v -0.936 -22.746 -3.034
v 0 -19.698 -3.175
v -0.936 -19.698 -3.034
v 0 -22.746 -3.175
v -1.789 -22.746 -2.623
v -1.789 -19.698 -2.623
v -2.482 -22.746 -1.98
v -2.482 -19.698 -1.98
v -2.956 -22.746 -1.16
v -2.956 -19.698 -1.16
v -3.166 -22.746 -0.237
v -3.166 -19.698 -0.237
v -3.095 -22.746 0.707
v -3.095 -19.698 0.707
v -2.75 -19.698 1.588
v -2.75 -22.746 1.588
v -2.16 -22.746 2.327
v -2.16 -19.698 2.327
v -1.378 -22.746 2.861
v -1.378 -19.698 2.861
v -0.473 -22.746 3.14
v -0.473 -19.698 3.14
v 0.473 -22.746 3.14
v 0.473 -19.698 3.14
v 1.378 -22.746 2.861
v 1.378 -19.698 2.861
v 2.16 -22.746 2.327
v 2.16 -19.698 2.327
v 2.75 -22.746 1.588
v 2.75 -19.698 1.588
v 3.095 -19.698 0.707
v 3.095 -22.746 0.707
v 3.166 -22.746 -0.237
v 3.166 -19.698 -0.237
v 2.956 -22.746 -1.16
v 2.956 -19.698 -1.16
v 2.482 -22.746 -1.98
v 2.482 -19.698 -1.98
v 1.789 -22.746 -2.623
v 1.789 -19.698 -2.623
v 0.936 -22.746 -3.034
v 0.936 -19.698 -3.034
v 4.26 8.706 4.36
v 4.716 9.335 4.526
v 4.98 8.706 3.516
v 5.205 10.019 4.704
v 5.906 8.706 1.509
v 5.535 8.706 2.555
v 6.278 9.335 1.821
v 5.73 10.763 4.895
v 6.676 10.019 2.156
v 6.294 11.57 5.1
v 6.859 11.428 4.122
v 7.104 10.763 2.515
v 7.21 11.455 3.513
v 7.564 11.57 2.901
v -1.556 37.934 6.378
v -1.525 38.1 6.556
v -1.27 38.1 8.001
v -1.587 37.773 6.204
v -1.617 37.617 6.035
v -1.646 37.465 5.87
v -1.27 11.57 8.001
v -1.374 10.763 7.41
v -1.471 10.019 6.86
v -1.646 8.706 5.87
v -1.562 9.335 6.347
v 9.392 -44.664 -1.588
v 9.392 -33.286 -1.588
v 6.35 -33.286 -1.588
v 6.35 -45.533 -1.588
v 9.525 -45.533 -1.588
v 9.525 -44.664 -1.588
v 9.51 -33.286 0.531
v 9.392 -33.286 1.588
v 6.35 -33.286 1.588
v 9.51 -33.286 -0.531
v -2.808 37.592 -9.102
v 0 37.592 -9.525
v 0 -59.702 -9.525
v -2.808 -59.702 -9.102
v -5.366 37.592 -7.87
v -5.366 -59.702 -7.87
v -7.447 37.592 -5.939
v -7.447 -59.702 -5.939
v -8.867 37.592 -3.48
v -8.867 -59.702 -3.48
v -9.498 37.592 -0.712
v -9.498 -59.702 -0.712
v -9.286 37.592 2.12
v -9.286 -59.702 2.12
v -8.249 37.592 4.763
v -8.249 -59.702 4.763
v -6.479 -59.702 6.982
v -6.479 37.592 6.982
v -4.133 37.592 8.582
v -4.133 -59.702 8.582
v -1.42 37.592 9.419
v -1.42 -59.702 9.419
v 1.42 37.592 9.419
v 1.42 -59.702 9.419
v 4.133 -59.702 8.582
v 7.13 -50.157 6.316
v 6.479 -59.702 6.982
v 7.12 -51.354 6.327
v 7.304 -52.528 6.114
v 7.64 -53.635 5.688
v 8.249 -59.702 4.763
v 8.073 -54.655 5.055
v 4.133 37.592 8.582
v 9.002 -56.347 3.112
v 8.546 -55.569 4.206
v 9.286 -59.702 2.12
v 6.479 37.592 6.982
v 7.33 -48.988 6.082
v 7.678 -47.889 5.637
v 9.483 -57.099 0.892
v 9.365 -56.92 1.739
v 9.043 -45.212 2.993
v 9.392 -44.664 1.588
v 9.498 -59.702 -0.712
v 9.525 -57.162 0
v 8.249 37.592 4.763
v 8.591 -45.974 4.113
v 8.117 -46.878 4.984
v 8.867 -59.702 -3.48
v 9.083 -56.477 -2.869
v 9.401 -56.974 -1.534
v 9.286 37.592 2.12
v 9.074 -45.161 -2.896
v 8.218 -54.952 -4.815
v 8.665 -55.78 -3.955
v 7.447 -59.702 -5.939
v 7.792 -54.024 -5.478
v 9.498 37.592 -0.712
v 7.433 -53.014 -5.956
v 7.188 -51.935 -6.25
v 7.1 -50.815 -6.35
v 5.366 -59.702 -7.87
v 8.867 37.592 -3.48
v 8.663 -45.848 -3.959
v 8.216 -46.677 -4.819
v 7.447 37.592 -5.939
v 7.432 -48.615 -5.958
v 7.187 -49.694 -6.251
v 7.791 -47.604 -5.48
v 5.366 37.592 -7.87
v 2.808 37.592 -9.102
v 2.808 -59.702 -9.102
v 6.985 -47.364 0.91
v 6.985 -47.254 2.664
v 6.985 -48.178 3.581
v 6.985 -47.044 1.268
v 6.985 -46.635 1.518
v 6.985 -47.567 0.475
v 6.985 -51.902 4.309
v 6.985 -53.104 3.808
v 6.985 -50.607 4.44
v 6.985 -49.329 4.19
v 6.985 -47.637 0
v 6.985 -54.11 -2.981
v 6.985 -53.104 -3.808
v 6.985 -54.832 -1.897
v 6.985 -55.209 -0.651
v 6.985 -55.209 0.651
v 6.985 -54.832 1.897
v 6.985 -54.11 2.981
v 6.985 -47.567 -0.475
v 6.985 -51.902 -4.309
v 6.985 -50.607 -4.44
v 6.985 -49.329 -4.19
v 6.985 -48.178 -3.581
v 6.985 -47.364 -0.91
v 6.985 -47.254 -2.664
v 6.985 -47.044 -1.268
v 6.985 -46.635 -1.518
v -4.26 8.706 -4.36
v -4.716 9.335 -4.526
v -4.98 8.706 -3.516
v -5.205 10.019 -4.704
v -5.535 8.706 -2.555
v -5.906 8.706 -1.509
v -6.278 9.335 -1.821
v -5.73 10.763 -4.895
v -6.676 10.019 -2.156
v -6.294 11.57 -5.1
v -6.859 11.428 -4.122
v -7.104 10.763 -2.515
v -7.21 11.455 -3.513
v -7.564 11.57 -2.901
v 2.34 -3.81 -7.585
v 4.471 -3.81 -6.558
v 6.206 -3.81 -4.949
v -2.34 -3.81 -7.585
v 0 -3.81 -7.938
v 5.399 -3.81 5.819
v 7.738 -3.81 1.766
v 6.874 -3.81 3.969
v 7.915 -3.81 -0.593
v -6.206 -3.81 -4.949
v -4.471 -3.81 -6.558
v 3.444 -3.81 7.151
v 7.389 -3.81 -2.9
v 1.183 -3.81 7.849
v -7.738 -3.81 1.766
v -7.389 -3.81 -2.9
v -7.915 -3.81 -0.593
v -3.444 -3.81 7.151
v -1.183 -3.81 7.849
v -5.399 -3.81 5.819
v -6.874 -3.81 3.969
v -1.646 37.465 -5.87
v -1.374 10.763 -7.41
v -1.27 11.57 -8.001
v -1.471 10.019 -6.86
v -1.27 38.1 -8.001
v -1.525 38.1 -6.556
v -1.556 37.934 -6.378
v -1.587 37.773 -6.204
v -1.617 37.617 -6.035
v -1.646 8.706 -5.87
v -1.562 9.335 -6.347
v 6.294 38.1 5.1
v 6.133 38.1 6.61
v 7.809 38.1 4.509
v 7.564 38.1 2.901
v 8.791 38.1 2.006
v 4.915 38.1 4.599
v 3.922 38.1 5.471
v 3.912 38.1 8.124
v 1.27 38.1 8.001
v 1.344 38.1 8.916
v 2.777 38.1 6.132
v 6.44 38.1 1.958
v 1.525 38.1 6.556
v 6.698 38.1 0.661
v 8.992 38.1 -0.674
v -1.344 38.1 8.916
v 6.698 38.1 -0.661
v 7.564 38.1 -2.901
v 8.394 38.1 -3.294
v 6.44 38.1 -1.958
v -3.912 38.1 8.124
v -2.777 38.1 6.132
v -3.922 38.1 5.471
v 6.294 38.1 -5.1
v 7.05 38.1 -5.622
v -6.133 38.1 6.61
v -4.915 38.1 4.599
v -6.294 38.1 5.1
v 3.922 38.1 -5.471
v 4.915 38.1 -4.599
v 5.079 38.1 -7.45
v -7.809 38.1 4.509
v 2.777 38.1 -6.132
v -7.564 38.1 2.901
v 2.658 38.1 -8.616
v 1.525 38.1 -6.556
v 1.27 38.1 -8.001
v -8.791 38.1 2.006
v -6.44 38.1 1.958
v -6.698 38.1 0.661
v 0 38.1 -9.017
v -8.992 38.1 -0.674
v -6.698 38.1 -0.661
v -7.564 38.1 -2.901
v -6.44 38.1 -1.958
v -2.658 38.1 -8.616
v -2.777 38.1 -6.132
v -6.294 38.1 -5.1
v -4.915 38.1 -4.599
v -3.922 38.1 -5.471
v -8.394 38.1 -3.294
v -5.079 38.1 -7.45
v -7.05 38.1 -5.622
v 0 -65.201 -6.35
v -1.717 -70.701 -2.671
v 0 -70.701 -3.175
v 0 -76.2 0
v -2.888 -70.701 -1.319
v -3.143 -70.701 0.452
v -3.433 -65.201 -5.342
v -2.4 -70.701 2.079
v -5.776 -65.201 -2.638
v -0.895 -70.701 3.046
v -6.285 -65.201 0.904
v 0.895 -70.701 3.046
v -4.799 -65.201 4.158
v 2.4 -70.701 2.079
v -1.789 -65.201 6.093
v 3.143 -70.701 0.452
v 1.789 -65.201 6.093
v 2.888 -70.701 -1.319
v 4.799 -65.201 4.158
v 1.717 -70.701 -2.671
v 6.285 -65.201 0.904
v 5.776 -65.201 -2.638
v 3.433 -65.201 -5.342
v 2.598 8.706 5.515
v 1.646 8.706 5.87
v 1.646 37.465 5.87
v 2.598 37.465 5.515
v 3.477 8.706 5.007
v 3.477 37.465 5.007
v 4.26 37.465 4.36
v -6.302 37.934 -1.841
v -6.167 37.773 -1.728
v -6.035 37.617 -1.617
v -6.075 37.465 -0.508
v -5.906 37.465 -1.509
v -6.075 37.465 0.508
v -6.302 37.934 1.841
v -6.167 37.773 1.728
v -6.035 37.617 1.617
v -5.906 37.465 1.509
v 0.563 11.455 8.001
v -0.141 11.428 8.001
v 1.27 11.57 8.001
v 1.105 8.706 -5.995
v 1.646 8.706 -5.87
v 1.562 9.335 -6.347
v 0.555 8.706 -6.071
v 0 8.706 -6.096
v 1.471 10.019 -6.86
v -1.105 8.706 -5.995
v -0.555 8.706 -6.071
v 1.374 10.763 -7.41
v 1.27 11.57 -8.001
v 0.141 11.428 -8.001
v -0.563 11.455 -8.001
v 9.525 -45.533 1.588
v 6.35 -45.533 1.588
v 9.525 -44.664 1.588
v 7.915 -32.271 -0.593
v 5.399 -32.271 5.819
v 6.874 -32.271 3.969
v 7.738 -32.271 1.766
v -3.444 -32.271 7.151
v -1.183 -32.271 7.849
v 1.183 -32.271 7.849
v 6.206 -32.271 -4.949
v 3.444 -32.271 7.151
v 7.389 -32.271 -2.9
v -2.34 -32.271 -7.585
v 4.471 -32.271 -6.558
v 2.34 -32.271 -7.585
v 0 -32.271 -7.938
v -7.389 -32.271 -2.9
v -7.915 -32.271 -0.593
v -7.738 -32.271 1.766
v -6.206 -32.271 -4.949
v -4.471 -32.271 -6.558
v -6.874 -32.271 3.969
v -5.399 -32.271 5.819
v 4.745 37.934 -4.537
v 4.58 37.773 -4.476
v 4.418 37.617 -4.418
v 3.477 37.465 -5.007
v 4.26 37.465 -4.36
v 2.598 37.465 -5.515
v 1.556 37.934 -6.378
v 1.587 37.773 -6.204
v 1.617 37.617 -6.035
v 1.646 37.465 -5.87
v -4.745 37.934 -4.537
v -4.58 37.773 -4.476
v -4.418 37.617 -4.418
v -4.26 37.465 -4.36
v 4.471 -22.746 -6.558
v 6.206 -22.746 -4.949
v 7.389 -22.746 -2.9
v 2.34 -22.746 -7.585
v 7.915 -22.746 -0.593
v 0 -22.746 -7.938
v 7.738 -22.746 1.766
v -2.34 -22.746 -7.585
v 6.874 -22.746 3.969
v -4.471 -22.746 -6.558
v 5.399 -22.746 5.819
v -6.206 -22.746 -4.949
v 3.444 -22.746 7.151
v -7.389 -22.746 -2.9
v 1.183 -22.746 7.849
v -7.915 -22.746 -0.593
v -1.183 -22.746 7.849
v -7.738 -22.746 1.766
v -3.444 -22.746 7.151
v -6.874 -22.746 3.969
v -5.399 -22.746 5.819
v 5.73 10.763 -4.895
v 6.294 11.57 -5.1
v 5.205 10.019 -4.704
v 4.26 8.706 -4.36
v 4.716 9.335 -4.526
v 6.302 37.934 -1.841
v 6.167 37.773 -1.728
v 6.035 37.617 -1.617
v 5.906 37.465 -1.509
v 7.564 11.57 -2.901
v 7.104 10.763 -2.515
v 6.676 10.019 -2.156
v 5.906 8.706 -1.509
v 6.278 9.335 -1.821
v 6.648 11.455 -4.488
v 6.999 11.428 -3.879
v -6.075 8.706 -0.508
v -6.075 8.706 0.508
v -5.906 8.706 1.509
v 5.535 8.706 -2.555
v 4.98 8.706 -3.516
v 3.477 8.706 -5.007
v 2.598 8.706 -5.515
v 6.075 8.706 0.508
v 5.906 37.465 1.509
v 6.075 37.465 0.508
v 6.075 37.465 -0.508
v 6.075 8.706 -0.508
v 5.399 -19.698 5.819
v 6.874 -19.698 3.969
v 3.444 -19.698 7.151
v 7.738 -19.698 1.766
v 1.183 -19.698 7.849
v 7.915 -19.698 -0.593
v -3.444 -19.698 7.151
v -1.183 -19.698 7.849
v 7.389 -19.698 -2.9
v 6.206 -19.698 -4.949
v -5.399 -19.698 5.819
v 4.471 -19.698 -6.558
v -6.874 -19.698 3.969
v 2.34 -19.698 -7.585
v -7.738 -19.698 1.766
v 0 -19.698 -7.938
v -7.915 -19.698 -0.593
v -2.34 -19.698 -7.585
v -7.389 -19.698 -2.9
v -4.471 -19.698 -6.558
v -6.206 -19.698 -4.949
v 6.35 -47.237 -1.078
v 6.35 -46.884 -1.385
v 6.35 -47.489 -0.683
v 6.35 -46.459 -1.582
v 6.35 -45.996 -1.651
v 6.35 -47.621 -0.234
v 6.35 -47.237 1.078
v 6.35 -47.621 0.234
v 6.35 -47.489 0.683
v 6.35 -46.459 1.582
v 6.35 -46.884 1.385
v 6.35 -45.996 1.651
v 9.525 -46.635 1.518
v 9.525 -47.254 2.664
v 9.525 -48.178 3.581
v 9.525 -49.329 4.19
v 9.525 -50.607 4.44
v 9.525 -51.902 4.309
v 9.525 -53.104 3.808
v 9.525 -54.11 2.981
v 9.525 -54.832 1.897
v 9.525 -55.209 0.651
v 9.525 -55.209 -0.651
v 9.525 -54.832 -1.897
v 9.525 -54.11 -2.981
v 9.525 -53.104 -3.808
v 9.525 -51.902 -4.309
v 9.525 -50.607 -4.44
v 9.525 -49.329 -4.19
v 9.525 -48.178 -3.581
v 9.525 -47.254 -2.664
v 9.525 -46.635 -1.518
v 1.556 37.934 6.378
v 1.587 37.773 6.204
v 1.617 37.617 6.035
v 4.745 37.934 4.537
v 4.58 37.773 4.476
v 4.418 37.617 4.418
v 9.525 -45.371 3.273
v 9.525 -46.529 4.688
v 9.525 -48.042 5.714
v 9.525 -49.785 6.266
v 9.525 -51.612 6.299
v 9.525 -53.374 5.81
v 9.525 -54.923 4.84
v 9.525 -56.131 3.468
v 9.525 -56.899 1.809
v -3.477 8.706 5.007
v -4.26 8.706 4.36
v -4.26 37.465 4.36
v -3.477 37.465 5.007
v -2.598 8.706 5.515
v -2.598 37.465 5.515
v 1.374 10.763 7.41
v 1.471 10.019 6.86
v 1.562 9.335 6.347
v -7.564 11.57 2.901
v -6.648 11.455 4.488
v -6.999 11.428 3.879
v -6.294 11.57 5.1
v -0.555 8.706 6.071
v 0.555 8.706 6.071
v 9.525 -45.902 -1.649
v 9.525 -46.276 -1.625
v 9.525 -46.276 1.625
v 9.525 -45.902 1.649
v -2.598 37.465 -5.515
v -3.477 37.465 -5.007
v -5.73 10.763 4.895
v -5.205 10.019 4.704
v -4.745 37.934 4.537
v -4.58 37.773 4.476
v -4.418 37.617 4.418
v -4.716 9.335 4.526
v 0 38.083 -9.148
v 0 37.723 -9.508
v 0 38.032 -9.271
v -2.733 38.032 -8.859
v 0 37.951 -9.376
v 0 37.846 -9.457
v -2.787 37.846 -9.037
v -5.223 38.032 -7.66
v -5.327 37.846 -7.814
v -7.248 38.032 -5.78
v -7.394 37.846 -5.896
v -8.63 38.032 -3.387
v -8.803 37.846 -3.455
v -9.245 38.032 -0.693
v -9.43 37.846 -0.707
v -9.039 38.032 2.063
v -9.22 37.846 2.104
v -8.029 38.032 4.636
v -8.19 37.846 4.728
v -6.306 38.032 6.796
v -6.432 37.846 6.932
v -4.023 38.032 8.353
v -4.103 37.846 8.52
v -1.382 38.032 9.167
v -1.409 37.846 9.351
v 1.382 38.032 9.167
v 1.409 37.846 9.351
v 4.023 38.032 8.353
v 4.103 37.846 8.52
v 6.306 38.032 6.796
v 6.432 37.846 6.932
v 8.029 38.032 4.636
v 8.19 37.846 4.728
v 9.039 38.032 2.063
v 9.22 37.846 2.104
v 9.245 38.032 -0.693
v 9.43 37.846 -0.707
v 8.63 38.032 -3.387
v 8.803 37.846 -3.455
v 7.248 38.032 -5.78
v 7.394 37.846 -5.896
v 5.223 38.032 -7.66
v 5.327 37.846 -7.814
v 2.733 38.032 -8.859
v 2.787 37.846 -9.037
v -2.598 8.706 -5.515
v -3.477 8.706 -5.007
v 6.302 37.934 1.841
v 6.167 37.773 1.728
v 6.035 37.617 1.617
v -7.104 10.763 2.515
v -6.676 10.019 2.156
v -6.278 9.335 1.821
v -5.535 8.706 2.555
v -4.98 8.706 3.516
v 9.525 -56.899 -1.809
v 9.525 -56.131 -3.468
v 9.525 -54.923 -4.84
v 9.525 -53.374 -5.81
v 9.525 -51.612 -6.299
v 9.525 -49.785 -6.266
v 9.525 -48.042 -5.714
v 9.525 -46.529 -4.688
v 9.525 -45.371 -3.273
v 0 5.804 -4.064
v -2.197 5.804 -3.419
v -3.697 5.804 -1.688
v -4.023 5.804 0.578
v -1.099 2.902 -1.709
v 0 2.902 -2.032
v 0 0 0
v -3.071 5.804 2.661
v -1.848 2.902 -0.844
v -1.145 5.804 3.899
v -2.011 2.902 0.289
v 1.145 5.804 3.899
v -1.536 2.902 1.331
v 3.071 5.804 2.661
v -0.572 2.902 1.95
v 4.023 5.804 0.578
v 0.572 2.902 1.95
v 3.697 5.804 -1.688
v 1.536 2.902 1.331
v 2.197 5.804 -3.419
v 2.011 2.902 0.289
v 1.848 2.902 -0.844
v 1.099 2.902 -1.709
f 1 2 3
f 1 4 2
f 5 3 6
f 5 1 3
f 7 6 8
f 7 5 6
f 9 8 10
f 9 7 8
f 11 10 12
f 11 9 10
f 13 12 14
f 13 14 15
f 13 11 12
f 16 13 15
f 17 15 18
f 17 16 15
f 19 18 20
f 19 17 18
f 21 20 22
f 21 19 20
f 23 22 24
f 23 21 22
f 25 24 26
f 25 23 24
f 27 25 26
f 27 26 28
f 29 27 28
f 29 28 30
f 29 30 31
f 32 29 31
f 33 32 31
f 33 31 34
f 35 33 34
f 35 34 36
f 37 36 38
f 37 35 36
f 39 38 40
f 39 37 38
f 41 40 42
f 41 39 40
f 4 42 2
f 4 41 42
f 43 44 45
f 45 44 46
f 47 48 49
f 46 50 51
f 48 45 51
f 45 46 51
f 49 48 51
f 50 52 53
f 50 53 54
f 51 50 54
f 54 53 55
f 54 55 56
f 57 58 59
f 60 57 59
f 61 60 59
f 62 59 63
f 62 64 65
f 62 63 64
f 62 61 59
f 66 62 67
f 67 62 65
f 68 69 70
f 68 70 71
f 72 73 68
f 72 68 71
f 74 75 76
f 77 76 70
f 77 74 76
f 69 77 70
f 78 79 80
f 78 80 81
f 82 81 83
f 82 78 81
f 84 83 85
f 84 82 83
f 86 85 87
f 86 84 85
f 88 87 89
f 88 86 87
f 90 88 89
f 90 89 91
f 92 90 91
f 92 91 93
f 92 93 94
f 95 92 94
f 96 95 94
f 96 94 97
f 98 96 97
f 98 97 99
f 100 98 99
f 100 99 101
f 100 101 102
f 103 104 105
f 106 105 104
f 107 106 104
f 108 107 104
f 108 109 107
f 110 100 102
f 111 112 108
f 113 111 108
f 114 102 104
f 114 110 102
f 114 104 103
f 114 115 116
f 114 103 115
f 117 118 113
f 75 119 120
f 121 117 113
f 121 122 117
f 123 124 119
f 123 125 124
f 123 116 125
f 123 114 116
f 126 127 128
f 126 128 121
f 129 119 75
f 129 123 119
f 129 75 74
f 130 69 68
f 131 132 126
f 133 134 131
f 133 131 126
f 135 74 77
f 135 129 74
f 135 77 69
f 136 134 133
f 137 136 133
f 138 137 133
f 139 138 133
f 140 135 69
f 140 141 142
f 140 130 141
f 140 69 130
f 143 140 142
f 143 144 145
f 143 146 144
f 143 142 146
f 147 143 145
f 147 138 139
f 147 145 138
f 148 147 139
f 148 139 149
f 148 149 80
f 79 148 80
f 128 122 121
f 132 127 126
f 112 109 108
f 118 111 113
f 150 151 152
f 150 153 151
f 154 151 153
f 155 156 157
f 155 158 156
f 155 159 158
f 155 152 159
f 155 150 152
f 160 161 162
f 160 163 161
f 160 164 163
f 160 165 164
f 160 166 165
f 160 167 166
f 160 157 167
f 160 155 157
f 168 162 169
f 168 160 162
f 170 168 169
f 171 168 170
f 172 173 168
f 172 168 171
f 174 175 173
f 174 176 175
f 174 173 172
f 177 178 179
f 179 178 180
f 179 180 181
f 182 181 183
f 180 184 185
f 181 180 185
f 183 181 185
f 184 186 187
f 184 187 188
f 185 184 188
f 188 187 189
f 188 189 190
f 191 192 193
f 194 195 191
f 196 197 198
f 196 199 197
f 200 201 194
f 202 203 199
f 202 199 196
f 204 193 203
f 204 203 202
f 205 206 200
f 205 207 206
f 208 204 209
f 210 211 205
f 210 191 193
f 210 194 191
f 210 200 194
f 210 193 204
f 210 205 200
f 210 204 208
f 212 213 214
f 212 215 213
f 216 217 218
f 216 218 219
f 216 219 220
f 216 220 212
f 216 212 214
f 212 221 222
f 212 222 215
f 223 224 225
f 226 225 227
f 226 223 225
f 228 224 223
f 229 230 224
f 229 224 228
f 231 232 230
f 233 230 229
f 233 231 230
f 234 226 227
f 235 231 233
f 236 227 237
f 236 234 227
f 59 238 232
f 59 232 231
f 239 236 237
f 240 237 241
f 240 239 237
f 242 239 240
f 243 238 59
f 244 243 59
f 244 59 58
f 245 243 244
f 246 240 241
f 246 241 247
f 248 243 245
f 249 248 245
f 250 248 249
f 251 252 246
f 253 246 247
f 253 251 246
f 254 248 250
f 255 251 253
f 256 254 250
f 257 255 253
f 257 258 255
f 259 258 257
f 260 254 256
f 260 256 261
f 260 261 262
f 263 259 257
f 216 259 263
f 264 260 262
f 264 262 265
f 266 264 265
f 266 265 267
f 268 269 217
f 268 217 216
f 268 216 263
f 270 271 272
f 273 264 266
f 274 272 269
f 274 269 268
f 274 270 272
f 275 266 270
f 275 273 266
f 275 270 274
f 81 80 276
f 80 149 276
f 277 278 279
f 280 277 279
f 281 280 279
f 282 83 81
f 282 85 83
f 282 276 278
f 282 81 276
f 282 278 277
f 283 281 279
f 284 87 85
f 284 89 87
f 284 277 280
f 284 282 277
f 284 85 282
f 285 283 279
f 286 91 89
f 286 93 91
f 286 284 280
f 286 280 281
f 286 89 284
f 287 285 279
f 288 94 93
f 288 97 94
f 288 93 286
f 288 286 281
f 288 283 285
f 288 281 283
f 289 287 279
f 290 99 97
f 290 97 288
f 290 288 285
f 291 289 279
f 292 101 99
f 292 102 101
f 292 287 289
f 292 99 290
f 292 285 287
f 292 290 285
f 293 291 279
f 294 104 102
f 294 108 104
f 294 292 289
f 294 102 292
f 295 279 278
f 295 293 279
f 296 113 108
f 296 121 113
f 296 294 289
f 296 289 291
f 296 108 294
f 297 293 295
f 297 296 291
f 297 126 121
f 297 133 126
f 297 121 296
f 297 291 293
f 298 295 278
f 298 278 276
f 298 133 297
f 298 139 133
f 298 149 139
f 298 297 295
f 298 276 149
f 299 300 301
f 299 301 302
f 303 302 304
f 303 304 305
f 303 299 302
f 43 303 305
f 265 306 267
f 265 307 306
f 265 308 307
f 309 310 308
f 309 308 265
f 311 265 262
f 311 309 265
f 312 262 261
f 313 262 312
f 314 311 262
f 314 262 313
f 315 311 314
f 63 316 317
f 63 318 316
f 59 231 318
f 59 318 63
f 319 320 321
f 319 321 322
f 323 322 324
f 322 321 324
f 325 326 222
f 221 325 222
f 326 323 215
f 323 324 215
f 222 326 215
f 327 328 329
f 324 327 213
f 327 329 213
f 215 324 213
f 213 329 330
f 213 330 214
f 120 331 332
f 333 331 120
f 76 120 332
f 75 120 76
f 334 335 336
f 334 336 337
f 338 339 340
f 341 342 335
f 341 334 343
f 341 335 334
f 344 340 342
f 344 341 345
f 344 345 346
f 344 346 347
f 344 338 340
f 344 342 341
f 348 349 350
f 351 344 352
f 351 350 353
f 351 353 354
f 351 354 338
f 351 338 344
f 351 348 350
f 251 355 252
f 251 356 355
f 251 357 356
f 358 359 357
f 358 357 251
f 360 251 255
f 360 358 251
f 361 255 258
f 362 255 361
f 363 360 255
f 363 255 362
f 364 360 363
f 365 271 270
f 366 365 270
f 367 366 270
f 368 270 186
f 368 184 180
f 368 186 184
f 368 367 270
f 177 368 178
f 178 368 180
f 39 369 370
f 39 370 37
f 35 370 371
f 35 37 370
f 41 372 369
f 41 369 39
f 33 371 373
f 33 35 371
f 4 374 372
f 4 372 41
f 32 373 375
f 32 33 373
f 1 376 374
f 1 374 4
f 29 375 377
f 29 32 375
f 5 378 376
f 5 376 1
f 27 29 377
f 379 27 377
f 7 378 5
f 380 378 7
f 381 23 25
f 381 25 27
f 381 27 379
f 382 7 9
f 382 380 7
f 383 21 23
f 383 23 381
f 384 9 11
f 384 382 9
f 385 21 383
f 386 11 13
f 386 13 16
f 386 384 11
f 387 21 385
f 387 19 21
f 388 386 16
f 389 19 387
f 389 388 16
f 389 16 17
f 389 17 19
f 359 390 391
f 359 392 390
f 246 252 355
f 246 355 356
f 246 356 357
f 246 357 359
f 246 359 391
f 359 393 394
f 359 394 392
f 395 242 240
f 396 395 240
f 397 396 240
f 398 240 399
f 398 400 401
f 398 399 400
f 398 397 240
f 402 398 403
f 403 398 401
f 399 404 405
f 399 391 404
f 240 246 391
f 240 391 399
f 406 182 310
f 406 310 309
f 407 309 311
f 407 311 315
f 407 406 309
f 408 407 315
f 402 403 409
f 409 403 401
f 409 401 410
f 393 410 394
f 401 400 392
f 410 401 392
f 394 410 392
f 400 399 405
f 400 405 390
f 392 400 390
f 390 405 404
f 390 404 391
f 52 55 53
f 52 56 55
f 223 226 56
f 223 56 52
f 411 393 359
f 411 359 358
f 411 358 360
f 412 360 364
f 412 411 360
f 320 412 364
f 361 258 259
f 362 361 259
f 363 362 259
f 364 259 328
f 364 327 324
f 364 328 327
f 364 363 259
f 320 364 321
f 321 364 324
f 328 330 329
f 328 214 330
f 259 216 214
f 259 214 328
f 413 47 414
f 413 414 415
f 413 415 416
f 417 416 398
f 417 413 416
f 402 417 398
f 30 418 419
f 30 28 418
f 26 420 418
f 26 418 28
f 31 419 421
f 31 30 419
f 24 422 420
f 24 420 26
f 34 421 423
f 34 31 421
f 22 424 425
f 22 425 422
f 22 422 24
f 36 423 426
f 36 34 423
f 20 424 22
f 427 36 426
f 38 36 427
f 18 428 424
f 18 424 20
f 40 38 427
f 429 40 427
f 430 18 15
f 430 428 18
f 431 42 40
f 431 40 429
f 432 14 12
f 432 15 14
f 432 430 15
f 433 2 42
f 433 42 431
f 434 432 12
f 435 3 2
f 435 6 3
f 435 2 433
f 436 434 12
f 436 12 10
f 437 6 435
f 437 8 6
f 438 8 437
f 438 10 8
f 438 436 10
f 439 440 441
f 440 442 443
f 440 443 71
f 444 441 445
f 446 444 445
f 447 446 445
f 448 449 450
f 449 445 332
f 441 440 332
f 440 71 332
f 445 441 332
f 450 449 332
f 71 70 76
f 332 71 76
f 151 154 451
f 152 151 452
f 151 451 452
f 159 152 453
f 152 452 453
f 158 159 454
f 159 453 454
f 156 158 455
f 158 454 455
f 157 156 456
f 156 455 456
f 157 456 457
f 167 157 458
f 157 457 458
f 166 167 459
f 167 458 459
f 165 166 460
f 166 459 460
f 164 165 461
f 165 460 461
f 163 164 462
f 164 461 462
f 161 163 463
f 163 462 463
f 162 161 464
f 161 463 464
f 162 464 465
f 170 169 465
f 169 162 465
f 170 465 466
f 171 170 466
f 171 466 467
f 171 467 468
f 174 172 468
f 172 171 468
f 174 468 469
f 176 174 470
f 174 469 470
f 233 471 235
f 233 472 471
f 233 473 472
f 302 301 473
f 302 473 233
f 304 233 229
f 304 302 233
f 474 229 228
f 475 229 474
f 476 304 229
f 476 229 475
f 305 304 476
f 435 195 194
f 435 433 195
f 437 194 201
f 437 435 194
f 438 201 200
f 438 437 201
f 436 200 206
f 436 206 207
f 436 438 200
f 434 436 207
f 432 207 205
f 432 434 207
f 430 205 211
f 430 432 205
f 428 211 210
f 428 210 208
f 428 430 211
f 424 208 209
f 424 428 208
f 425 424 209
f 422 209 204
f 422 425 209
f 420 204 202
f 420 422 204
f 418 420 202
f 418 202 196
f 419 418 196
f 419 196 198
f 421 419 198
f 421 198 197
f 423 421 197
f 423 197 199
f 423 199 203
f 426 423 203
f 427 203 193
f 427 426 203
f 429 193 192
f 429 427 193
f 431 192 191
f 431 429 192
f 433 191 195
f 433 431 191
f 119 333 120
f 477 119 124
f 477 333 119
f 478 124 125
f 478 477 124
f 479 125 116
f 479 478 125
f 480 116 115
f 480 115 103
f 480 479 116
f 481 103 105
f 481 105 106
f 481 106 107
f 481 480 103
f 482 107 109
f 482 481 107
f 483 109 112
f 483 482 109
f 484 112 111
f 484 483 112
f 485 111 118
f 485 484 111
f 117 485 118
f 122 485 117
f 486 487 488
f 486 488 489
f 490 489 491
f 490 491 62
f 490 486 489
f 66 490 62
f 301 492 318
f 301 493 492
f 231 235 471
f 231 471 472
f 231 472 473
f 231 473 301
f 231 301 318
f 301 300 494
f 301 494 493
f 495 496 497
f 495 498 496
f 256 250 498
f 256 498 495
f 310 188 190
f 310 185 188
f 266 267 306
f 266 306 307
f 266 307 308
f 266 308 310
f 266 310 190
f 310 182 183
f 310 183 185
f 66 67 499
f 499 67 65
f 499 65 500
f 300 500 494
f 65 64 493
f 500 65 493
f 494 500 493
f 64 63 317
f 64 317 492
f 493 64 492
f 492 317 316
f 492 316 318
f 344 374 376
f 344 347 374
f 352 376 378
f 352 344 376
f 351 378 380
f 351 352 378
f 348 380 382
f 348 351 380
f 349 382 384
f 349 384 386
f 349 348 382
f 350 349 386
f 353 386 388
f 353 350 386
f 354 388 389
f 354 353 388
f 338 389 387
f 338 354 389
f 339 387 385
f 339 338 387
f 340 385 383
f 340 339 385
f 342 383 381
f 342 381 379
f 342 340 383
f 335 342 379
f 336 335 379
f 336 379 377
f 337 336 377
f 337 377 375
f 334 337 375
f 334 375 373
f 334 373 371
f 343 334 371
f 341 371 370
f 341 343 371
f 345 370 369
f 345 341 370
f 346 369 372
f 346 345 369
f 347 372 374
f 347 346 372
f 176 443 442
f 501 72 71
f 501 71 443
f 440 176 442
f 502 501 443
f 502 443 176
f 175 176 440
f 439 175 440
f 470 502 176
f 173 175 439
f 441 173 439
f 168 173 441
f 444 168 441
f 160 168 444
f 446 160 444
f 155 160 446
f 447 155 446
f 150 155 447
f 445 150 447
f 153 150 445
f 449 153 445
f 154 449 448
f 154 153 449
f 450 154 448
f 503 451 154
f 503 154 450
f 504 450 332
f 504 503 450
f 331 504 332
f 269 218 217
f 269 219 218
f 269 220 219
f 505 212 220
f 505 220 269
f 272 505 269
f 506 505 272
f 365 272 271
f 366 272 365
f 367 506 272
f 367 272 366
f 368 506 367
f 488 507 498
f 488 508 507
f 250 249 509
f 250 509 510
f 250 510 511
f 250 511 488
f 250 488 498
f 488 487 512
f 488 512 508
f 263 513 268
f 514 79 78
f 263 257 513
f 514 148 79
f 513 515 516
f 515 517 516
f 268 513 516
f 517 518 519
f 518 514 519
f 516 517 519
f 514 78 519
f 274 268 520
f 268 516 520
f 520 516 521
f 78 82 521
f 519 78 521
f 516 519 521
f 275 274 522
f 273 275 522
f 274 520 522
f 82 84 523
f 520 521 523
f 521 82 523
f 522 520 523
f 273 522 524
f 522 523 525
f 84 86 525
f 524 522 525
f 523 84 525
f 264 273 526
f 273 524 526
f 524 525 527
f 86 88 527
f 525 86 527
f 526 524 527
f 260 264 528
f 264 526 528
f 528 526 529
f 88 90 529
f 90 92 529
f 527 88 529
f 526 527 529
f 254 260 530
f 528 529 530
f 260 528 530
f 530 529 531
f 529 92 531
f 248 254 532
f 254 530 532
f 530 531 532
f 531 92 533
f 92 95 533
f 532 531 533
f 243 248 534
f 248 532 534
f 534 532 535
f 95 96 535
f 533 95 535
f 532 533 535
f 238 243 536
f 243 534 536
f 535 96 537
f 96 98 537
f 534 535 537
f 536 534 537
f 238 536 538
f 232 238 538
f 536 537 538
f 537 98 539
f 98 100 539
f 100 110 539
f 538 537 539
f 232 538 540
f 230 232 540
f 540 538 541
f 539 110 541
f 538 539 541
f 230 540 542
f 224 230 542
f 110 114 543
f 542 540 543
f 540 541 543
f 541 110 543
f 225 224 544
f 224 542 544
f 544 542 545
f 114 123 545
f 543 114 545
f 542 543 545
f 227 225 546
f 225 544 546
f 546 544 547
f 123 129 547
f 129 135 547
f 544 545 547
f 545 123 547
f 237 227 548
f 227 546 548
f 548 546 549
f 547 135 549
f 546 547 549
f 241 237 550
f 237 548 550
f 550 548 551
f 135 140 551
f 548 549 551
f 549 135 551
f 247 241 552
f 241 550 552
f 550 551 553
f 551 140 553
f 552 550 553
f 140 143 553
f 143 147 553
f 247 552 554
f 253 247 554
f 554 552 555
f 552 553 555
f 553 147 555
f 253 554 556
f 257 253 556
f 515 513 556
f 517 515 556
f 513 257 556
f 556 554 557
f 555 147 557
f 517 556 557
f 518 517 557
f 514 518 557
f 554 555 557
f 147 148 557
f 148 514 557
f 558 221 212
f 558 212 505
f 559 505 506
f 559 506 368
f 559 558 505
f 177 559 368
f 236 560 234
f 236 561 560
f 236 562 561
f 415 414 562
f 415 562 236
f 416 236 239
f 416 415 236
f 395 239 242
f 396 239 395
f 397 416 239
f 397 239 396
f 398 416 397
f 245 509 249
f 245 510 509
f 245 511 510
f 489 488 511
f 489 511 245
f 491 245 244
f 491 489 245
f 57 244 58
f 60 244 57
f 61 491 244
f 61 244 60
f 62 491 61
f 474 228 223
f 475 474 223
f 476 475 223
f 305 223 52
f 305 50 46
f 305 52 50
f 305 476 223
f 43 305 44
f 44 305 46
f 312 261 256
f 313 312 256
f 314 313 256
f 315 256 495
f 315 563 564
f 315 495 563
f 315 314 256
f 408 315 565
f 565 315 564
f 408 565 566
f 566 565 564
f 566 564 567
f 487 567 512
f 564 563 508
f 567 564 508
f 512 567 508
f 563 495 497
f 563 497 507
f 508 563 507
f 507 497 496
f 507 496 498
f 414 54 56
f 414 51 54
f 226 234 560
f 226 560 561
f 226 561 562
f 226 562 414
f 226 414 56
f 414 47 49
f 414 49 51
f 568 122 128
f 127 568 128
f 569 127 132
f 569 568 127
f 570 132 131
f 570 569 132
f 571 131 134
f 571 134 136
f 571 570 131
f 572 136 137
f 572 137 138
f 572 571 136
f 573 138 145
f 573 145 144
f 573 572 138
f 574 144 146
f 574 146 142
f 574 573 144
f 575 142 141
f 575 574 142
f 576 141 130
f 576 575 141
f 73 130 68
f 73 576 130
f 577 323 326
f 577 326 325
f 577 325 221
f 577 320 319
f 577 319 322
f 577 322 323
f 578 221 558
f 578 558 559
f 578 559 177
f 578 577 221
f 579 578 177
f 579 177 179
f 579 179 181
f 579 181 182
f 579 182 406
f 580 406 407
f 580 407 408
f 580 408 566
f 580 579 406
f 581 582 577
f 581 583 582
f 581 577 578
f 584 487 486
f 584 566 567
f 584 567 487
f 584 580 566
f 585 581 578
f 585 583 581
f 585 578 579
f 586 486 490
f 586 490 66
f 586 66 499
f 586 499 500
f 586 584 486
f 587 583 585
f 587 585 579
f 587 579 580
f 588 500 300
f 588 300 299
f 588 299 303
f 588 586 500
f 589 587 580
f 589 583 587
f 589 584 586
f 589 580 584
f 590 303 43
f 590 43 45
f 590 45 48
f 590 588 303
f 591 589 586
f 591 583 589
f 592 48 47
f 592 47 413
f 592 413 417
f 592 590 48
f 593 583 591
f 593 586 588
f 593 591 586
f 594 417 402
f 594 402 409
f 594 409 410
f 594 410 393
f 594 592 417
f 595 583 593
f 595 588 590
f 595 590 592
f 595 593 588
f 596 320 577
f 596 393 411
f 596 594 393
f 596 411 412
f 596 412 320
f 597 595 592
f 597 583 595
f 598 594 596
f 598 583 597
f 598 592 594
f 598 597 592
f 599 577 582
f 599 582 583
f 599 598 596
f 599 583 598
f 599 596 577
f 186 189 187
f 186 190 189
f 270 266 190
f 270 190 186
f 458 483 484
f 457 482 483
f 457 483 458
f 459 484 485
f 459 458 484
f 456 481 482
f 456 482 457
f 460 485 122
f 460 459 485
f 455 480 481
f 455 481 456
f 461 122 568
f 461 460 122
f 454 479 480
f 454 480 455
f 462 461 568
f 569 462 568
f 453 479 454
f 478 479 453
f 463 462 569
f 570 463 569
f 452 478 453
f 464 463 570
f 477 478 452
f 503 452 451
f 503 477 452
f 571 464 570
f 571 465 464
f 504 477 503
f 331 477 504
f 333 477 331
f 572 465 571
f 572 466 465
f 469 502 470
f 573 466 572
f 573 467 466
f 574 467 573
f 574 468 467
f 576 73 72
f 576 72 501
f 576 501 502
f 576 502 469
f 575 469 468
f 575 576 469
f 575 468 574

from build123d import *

# Parameters (mm, degrees)
BOSS_EXTRUDE1_REACH = 81.121
SENSOR_R            = 6.35
CHAMFER1_SIZE       = 0.635
FILLET3_R           = 0.508
SKETCH4_R           = 4.445
CUT_EXTRUDE1_DEPTH  = 2.54
CUT_EXTRUDE2_DEPTH  = 3.175
CUT_EXTRUDE8_REACH  = 117.091
CIRPATTERN1_COUNT   = 6


with BuildPart() as part:
    # Sketch1 → mainBody (revolve)
    with BuildSketch(Plane(origin=(0, 0, 0), x_dir=(0, 0, -1), z_dir=(1, 0, 0)), mode=Mode.PRIVATE) as mainbody_sk:
        Polygon((-6.096, 38.1), (-6.096, 8.705990249), (0, 0), (0, -76.2), (-9.525, -59.702216058), (-9.525, 38.1), align=None)
    revolve(mainbody_sk.sketch.rotate(Axis((0, 0, 0), (0, 1, 0)), 180), axis=Axis((0, 0, 0), (0, 1, 0)))

    # sensor → Boss-Extrude1 (add, up to next)
    with BuildSketch(Plane(origin=(9.525, 0, 0), x_dir=(0, 0, -1), z_dir=(1, 0, 0)), mode=Mode.PRIVATE) as boss_extrude1_sk1:
        with Locations((0, -50.812216058)):
            Circle(SENSOR_R)
    boss_extrude1_tool1 = extrude(boss_extrude1_sk1.sketch, amount=-BOSS_EXTRUDE1_REACH, mode=Mode.PRIVATE) - part.part
    add(boss_extrude1_tool1.solids().sort_by_distance((9.525, -50.812216, 0))[0])
    add(boss_extrude1_tool1.solids().sort_by_distance((9.525, -50.812216, 0))[1])

    # Chamfer1
    chamfer1_edges = [part.edges().sort_by_distance(p)[0] for p in [
        (0, 38.1, 6.096),
    ]]
    chamfer(chamfer1_edges, length=CHAMFER1_SIZE)

    # Fillet3
    fillet3_edges = [part.edges().sort_by_distance(p)[0] for p in [
        (0, 38.1, 9.525),
    ]]
    fillet(fillet3_edges, radius=FILLET3_R)

    # Sketch4 → Cut-Extrude1 (cut)
    with BuildSketch(Plane(origin=(9.525, 0, 0), x_dir=(0, 0, -1), z_dir=(1, 0, 0))):
        with Locations((0, -50.812216058)):
            Circle(SKETCH4_R)
    extrude(amount=-CUT_EXTRUDE1_DEPTH, mode=Mode.SUBTRACT)

    # Sketch5 → Cut-Extrude2 (cut)
    with BuildSketch(Plane(origin=(9.525, 0, 0), x_dir=(0, 0, -1), z_dir=(1, 0, 0))):
        with BuildLine():
            Line((-1.5875, -33.286216058), (1.5875, -33.286216058))
            Line((1.5875, -33.286216058), (1.5875, -45.532735353))
            ThreePointArc((1.5875, -45.532735353), (0, -47.637216058), (-1.5875, -45.532735353))
            Line((-1.5875, -45.532735353), (-1.5875, -33.286216058))
        make_face()
    extrude(amount=-CUT_EXTRUDE2_DEPTH, mode=Mode.SUBTRACT)

    # Cut-Extrude8: up to this cone (the profile starts inside it)
    cut_extrude8_end = Plane(origin=(0, 38.1, 0), z_dir=(0, 1, 0)).offset(-38.099999) * Cone(1e-06, 127.696083561, 182.368906206, align=(Align.CENTER, Align.CENTER, Align.MIN), mode=Mode.PRIVATE)
    # Sketch13 → Cut-Extrude8 (cut, up to the surface)
    with BuildSketch(Plane(origin=(0, 38.1, 0), x_dir=(1, 0, 0), z_dir=(0, 1, 0)), mode=Mode.PRIVATE) as cut_extrude8_sk1:
        Polygon((-1.27, 8.001), (1.27, 8.001), (2.27589157, 2.296305428), (-2.27589157, 2.296305428), align=None)
    cut_extrude8_tool1 = extrude(cut_extrude8_sk1.sketch, amount=-CUT_EXTRUDE8_REACH, mode=Mode.PRIVATE) & cut_extrude8_end
    cut_extrude8 = cut_extrude8_tool1.solids().sort_by_distance((0, 38.1, -4.878937))[0]
    add(cut_extrude8, mode=Mode.SUBTRACT)

    # CirPattern1: Cut-Extrude8 ×6 about axis
    cirpattern1_axis = Axis((0, 0, 0), (0, 1, 0))
    for i in range(1, CIRPATTERN1_COUNT):
        add(cut_extrude8.rotate(cirpattern1_axis, i * 360 / CIRPATTERN1_COUNT), mode=Mode.SUBTRACT)

    # Sketch14 → Cut-Revolve4 (revolve, cut)
    with BuildSketch(Plane.XY, mode=Mode.PRIVATE) as cut_revolve4_sk:
        Polygon((0, -3.81), (7.9375, -3.81), (7.9375, -19.6977), (3.175, -19.6977), (3.175, -22.7457), (7.9375, -22.7457), (7.9375, -32.2707), (0, -32.2707), align=None)
    revolve(cut_revolve4_sk.sketch.rotate(Axis((0, 0, 0), (0, 1, 0)), 90), axis=Axis((0, 0, 0), (0, 1, 0)), mode=Mode.SUBTRACT)


solid = part.part
